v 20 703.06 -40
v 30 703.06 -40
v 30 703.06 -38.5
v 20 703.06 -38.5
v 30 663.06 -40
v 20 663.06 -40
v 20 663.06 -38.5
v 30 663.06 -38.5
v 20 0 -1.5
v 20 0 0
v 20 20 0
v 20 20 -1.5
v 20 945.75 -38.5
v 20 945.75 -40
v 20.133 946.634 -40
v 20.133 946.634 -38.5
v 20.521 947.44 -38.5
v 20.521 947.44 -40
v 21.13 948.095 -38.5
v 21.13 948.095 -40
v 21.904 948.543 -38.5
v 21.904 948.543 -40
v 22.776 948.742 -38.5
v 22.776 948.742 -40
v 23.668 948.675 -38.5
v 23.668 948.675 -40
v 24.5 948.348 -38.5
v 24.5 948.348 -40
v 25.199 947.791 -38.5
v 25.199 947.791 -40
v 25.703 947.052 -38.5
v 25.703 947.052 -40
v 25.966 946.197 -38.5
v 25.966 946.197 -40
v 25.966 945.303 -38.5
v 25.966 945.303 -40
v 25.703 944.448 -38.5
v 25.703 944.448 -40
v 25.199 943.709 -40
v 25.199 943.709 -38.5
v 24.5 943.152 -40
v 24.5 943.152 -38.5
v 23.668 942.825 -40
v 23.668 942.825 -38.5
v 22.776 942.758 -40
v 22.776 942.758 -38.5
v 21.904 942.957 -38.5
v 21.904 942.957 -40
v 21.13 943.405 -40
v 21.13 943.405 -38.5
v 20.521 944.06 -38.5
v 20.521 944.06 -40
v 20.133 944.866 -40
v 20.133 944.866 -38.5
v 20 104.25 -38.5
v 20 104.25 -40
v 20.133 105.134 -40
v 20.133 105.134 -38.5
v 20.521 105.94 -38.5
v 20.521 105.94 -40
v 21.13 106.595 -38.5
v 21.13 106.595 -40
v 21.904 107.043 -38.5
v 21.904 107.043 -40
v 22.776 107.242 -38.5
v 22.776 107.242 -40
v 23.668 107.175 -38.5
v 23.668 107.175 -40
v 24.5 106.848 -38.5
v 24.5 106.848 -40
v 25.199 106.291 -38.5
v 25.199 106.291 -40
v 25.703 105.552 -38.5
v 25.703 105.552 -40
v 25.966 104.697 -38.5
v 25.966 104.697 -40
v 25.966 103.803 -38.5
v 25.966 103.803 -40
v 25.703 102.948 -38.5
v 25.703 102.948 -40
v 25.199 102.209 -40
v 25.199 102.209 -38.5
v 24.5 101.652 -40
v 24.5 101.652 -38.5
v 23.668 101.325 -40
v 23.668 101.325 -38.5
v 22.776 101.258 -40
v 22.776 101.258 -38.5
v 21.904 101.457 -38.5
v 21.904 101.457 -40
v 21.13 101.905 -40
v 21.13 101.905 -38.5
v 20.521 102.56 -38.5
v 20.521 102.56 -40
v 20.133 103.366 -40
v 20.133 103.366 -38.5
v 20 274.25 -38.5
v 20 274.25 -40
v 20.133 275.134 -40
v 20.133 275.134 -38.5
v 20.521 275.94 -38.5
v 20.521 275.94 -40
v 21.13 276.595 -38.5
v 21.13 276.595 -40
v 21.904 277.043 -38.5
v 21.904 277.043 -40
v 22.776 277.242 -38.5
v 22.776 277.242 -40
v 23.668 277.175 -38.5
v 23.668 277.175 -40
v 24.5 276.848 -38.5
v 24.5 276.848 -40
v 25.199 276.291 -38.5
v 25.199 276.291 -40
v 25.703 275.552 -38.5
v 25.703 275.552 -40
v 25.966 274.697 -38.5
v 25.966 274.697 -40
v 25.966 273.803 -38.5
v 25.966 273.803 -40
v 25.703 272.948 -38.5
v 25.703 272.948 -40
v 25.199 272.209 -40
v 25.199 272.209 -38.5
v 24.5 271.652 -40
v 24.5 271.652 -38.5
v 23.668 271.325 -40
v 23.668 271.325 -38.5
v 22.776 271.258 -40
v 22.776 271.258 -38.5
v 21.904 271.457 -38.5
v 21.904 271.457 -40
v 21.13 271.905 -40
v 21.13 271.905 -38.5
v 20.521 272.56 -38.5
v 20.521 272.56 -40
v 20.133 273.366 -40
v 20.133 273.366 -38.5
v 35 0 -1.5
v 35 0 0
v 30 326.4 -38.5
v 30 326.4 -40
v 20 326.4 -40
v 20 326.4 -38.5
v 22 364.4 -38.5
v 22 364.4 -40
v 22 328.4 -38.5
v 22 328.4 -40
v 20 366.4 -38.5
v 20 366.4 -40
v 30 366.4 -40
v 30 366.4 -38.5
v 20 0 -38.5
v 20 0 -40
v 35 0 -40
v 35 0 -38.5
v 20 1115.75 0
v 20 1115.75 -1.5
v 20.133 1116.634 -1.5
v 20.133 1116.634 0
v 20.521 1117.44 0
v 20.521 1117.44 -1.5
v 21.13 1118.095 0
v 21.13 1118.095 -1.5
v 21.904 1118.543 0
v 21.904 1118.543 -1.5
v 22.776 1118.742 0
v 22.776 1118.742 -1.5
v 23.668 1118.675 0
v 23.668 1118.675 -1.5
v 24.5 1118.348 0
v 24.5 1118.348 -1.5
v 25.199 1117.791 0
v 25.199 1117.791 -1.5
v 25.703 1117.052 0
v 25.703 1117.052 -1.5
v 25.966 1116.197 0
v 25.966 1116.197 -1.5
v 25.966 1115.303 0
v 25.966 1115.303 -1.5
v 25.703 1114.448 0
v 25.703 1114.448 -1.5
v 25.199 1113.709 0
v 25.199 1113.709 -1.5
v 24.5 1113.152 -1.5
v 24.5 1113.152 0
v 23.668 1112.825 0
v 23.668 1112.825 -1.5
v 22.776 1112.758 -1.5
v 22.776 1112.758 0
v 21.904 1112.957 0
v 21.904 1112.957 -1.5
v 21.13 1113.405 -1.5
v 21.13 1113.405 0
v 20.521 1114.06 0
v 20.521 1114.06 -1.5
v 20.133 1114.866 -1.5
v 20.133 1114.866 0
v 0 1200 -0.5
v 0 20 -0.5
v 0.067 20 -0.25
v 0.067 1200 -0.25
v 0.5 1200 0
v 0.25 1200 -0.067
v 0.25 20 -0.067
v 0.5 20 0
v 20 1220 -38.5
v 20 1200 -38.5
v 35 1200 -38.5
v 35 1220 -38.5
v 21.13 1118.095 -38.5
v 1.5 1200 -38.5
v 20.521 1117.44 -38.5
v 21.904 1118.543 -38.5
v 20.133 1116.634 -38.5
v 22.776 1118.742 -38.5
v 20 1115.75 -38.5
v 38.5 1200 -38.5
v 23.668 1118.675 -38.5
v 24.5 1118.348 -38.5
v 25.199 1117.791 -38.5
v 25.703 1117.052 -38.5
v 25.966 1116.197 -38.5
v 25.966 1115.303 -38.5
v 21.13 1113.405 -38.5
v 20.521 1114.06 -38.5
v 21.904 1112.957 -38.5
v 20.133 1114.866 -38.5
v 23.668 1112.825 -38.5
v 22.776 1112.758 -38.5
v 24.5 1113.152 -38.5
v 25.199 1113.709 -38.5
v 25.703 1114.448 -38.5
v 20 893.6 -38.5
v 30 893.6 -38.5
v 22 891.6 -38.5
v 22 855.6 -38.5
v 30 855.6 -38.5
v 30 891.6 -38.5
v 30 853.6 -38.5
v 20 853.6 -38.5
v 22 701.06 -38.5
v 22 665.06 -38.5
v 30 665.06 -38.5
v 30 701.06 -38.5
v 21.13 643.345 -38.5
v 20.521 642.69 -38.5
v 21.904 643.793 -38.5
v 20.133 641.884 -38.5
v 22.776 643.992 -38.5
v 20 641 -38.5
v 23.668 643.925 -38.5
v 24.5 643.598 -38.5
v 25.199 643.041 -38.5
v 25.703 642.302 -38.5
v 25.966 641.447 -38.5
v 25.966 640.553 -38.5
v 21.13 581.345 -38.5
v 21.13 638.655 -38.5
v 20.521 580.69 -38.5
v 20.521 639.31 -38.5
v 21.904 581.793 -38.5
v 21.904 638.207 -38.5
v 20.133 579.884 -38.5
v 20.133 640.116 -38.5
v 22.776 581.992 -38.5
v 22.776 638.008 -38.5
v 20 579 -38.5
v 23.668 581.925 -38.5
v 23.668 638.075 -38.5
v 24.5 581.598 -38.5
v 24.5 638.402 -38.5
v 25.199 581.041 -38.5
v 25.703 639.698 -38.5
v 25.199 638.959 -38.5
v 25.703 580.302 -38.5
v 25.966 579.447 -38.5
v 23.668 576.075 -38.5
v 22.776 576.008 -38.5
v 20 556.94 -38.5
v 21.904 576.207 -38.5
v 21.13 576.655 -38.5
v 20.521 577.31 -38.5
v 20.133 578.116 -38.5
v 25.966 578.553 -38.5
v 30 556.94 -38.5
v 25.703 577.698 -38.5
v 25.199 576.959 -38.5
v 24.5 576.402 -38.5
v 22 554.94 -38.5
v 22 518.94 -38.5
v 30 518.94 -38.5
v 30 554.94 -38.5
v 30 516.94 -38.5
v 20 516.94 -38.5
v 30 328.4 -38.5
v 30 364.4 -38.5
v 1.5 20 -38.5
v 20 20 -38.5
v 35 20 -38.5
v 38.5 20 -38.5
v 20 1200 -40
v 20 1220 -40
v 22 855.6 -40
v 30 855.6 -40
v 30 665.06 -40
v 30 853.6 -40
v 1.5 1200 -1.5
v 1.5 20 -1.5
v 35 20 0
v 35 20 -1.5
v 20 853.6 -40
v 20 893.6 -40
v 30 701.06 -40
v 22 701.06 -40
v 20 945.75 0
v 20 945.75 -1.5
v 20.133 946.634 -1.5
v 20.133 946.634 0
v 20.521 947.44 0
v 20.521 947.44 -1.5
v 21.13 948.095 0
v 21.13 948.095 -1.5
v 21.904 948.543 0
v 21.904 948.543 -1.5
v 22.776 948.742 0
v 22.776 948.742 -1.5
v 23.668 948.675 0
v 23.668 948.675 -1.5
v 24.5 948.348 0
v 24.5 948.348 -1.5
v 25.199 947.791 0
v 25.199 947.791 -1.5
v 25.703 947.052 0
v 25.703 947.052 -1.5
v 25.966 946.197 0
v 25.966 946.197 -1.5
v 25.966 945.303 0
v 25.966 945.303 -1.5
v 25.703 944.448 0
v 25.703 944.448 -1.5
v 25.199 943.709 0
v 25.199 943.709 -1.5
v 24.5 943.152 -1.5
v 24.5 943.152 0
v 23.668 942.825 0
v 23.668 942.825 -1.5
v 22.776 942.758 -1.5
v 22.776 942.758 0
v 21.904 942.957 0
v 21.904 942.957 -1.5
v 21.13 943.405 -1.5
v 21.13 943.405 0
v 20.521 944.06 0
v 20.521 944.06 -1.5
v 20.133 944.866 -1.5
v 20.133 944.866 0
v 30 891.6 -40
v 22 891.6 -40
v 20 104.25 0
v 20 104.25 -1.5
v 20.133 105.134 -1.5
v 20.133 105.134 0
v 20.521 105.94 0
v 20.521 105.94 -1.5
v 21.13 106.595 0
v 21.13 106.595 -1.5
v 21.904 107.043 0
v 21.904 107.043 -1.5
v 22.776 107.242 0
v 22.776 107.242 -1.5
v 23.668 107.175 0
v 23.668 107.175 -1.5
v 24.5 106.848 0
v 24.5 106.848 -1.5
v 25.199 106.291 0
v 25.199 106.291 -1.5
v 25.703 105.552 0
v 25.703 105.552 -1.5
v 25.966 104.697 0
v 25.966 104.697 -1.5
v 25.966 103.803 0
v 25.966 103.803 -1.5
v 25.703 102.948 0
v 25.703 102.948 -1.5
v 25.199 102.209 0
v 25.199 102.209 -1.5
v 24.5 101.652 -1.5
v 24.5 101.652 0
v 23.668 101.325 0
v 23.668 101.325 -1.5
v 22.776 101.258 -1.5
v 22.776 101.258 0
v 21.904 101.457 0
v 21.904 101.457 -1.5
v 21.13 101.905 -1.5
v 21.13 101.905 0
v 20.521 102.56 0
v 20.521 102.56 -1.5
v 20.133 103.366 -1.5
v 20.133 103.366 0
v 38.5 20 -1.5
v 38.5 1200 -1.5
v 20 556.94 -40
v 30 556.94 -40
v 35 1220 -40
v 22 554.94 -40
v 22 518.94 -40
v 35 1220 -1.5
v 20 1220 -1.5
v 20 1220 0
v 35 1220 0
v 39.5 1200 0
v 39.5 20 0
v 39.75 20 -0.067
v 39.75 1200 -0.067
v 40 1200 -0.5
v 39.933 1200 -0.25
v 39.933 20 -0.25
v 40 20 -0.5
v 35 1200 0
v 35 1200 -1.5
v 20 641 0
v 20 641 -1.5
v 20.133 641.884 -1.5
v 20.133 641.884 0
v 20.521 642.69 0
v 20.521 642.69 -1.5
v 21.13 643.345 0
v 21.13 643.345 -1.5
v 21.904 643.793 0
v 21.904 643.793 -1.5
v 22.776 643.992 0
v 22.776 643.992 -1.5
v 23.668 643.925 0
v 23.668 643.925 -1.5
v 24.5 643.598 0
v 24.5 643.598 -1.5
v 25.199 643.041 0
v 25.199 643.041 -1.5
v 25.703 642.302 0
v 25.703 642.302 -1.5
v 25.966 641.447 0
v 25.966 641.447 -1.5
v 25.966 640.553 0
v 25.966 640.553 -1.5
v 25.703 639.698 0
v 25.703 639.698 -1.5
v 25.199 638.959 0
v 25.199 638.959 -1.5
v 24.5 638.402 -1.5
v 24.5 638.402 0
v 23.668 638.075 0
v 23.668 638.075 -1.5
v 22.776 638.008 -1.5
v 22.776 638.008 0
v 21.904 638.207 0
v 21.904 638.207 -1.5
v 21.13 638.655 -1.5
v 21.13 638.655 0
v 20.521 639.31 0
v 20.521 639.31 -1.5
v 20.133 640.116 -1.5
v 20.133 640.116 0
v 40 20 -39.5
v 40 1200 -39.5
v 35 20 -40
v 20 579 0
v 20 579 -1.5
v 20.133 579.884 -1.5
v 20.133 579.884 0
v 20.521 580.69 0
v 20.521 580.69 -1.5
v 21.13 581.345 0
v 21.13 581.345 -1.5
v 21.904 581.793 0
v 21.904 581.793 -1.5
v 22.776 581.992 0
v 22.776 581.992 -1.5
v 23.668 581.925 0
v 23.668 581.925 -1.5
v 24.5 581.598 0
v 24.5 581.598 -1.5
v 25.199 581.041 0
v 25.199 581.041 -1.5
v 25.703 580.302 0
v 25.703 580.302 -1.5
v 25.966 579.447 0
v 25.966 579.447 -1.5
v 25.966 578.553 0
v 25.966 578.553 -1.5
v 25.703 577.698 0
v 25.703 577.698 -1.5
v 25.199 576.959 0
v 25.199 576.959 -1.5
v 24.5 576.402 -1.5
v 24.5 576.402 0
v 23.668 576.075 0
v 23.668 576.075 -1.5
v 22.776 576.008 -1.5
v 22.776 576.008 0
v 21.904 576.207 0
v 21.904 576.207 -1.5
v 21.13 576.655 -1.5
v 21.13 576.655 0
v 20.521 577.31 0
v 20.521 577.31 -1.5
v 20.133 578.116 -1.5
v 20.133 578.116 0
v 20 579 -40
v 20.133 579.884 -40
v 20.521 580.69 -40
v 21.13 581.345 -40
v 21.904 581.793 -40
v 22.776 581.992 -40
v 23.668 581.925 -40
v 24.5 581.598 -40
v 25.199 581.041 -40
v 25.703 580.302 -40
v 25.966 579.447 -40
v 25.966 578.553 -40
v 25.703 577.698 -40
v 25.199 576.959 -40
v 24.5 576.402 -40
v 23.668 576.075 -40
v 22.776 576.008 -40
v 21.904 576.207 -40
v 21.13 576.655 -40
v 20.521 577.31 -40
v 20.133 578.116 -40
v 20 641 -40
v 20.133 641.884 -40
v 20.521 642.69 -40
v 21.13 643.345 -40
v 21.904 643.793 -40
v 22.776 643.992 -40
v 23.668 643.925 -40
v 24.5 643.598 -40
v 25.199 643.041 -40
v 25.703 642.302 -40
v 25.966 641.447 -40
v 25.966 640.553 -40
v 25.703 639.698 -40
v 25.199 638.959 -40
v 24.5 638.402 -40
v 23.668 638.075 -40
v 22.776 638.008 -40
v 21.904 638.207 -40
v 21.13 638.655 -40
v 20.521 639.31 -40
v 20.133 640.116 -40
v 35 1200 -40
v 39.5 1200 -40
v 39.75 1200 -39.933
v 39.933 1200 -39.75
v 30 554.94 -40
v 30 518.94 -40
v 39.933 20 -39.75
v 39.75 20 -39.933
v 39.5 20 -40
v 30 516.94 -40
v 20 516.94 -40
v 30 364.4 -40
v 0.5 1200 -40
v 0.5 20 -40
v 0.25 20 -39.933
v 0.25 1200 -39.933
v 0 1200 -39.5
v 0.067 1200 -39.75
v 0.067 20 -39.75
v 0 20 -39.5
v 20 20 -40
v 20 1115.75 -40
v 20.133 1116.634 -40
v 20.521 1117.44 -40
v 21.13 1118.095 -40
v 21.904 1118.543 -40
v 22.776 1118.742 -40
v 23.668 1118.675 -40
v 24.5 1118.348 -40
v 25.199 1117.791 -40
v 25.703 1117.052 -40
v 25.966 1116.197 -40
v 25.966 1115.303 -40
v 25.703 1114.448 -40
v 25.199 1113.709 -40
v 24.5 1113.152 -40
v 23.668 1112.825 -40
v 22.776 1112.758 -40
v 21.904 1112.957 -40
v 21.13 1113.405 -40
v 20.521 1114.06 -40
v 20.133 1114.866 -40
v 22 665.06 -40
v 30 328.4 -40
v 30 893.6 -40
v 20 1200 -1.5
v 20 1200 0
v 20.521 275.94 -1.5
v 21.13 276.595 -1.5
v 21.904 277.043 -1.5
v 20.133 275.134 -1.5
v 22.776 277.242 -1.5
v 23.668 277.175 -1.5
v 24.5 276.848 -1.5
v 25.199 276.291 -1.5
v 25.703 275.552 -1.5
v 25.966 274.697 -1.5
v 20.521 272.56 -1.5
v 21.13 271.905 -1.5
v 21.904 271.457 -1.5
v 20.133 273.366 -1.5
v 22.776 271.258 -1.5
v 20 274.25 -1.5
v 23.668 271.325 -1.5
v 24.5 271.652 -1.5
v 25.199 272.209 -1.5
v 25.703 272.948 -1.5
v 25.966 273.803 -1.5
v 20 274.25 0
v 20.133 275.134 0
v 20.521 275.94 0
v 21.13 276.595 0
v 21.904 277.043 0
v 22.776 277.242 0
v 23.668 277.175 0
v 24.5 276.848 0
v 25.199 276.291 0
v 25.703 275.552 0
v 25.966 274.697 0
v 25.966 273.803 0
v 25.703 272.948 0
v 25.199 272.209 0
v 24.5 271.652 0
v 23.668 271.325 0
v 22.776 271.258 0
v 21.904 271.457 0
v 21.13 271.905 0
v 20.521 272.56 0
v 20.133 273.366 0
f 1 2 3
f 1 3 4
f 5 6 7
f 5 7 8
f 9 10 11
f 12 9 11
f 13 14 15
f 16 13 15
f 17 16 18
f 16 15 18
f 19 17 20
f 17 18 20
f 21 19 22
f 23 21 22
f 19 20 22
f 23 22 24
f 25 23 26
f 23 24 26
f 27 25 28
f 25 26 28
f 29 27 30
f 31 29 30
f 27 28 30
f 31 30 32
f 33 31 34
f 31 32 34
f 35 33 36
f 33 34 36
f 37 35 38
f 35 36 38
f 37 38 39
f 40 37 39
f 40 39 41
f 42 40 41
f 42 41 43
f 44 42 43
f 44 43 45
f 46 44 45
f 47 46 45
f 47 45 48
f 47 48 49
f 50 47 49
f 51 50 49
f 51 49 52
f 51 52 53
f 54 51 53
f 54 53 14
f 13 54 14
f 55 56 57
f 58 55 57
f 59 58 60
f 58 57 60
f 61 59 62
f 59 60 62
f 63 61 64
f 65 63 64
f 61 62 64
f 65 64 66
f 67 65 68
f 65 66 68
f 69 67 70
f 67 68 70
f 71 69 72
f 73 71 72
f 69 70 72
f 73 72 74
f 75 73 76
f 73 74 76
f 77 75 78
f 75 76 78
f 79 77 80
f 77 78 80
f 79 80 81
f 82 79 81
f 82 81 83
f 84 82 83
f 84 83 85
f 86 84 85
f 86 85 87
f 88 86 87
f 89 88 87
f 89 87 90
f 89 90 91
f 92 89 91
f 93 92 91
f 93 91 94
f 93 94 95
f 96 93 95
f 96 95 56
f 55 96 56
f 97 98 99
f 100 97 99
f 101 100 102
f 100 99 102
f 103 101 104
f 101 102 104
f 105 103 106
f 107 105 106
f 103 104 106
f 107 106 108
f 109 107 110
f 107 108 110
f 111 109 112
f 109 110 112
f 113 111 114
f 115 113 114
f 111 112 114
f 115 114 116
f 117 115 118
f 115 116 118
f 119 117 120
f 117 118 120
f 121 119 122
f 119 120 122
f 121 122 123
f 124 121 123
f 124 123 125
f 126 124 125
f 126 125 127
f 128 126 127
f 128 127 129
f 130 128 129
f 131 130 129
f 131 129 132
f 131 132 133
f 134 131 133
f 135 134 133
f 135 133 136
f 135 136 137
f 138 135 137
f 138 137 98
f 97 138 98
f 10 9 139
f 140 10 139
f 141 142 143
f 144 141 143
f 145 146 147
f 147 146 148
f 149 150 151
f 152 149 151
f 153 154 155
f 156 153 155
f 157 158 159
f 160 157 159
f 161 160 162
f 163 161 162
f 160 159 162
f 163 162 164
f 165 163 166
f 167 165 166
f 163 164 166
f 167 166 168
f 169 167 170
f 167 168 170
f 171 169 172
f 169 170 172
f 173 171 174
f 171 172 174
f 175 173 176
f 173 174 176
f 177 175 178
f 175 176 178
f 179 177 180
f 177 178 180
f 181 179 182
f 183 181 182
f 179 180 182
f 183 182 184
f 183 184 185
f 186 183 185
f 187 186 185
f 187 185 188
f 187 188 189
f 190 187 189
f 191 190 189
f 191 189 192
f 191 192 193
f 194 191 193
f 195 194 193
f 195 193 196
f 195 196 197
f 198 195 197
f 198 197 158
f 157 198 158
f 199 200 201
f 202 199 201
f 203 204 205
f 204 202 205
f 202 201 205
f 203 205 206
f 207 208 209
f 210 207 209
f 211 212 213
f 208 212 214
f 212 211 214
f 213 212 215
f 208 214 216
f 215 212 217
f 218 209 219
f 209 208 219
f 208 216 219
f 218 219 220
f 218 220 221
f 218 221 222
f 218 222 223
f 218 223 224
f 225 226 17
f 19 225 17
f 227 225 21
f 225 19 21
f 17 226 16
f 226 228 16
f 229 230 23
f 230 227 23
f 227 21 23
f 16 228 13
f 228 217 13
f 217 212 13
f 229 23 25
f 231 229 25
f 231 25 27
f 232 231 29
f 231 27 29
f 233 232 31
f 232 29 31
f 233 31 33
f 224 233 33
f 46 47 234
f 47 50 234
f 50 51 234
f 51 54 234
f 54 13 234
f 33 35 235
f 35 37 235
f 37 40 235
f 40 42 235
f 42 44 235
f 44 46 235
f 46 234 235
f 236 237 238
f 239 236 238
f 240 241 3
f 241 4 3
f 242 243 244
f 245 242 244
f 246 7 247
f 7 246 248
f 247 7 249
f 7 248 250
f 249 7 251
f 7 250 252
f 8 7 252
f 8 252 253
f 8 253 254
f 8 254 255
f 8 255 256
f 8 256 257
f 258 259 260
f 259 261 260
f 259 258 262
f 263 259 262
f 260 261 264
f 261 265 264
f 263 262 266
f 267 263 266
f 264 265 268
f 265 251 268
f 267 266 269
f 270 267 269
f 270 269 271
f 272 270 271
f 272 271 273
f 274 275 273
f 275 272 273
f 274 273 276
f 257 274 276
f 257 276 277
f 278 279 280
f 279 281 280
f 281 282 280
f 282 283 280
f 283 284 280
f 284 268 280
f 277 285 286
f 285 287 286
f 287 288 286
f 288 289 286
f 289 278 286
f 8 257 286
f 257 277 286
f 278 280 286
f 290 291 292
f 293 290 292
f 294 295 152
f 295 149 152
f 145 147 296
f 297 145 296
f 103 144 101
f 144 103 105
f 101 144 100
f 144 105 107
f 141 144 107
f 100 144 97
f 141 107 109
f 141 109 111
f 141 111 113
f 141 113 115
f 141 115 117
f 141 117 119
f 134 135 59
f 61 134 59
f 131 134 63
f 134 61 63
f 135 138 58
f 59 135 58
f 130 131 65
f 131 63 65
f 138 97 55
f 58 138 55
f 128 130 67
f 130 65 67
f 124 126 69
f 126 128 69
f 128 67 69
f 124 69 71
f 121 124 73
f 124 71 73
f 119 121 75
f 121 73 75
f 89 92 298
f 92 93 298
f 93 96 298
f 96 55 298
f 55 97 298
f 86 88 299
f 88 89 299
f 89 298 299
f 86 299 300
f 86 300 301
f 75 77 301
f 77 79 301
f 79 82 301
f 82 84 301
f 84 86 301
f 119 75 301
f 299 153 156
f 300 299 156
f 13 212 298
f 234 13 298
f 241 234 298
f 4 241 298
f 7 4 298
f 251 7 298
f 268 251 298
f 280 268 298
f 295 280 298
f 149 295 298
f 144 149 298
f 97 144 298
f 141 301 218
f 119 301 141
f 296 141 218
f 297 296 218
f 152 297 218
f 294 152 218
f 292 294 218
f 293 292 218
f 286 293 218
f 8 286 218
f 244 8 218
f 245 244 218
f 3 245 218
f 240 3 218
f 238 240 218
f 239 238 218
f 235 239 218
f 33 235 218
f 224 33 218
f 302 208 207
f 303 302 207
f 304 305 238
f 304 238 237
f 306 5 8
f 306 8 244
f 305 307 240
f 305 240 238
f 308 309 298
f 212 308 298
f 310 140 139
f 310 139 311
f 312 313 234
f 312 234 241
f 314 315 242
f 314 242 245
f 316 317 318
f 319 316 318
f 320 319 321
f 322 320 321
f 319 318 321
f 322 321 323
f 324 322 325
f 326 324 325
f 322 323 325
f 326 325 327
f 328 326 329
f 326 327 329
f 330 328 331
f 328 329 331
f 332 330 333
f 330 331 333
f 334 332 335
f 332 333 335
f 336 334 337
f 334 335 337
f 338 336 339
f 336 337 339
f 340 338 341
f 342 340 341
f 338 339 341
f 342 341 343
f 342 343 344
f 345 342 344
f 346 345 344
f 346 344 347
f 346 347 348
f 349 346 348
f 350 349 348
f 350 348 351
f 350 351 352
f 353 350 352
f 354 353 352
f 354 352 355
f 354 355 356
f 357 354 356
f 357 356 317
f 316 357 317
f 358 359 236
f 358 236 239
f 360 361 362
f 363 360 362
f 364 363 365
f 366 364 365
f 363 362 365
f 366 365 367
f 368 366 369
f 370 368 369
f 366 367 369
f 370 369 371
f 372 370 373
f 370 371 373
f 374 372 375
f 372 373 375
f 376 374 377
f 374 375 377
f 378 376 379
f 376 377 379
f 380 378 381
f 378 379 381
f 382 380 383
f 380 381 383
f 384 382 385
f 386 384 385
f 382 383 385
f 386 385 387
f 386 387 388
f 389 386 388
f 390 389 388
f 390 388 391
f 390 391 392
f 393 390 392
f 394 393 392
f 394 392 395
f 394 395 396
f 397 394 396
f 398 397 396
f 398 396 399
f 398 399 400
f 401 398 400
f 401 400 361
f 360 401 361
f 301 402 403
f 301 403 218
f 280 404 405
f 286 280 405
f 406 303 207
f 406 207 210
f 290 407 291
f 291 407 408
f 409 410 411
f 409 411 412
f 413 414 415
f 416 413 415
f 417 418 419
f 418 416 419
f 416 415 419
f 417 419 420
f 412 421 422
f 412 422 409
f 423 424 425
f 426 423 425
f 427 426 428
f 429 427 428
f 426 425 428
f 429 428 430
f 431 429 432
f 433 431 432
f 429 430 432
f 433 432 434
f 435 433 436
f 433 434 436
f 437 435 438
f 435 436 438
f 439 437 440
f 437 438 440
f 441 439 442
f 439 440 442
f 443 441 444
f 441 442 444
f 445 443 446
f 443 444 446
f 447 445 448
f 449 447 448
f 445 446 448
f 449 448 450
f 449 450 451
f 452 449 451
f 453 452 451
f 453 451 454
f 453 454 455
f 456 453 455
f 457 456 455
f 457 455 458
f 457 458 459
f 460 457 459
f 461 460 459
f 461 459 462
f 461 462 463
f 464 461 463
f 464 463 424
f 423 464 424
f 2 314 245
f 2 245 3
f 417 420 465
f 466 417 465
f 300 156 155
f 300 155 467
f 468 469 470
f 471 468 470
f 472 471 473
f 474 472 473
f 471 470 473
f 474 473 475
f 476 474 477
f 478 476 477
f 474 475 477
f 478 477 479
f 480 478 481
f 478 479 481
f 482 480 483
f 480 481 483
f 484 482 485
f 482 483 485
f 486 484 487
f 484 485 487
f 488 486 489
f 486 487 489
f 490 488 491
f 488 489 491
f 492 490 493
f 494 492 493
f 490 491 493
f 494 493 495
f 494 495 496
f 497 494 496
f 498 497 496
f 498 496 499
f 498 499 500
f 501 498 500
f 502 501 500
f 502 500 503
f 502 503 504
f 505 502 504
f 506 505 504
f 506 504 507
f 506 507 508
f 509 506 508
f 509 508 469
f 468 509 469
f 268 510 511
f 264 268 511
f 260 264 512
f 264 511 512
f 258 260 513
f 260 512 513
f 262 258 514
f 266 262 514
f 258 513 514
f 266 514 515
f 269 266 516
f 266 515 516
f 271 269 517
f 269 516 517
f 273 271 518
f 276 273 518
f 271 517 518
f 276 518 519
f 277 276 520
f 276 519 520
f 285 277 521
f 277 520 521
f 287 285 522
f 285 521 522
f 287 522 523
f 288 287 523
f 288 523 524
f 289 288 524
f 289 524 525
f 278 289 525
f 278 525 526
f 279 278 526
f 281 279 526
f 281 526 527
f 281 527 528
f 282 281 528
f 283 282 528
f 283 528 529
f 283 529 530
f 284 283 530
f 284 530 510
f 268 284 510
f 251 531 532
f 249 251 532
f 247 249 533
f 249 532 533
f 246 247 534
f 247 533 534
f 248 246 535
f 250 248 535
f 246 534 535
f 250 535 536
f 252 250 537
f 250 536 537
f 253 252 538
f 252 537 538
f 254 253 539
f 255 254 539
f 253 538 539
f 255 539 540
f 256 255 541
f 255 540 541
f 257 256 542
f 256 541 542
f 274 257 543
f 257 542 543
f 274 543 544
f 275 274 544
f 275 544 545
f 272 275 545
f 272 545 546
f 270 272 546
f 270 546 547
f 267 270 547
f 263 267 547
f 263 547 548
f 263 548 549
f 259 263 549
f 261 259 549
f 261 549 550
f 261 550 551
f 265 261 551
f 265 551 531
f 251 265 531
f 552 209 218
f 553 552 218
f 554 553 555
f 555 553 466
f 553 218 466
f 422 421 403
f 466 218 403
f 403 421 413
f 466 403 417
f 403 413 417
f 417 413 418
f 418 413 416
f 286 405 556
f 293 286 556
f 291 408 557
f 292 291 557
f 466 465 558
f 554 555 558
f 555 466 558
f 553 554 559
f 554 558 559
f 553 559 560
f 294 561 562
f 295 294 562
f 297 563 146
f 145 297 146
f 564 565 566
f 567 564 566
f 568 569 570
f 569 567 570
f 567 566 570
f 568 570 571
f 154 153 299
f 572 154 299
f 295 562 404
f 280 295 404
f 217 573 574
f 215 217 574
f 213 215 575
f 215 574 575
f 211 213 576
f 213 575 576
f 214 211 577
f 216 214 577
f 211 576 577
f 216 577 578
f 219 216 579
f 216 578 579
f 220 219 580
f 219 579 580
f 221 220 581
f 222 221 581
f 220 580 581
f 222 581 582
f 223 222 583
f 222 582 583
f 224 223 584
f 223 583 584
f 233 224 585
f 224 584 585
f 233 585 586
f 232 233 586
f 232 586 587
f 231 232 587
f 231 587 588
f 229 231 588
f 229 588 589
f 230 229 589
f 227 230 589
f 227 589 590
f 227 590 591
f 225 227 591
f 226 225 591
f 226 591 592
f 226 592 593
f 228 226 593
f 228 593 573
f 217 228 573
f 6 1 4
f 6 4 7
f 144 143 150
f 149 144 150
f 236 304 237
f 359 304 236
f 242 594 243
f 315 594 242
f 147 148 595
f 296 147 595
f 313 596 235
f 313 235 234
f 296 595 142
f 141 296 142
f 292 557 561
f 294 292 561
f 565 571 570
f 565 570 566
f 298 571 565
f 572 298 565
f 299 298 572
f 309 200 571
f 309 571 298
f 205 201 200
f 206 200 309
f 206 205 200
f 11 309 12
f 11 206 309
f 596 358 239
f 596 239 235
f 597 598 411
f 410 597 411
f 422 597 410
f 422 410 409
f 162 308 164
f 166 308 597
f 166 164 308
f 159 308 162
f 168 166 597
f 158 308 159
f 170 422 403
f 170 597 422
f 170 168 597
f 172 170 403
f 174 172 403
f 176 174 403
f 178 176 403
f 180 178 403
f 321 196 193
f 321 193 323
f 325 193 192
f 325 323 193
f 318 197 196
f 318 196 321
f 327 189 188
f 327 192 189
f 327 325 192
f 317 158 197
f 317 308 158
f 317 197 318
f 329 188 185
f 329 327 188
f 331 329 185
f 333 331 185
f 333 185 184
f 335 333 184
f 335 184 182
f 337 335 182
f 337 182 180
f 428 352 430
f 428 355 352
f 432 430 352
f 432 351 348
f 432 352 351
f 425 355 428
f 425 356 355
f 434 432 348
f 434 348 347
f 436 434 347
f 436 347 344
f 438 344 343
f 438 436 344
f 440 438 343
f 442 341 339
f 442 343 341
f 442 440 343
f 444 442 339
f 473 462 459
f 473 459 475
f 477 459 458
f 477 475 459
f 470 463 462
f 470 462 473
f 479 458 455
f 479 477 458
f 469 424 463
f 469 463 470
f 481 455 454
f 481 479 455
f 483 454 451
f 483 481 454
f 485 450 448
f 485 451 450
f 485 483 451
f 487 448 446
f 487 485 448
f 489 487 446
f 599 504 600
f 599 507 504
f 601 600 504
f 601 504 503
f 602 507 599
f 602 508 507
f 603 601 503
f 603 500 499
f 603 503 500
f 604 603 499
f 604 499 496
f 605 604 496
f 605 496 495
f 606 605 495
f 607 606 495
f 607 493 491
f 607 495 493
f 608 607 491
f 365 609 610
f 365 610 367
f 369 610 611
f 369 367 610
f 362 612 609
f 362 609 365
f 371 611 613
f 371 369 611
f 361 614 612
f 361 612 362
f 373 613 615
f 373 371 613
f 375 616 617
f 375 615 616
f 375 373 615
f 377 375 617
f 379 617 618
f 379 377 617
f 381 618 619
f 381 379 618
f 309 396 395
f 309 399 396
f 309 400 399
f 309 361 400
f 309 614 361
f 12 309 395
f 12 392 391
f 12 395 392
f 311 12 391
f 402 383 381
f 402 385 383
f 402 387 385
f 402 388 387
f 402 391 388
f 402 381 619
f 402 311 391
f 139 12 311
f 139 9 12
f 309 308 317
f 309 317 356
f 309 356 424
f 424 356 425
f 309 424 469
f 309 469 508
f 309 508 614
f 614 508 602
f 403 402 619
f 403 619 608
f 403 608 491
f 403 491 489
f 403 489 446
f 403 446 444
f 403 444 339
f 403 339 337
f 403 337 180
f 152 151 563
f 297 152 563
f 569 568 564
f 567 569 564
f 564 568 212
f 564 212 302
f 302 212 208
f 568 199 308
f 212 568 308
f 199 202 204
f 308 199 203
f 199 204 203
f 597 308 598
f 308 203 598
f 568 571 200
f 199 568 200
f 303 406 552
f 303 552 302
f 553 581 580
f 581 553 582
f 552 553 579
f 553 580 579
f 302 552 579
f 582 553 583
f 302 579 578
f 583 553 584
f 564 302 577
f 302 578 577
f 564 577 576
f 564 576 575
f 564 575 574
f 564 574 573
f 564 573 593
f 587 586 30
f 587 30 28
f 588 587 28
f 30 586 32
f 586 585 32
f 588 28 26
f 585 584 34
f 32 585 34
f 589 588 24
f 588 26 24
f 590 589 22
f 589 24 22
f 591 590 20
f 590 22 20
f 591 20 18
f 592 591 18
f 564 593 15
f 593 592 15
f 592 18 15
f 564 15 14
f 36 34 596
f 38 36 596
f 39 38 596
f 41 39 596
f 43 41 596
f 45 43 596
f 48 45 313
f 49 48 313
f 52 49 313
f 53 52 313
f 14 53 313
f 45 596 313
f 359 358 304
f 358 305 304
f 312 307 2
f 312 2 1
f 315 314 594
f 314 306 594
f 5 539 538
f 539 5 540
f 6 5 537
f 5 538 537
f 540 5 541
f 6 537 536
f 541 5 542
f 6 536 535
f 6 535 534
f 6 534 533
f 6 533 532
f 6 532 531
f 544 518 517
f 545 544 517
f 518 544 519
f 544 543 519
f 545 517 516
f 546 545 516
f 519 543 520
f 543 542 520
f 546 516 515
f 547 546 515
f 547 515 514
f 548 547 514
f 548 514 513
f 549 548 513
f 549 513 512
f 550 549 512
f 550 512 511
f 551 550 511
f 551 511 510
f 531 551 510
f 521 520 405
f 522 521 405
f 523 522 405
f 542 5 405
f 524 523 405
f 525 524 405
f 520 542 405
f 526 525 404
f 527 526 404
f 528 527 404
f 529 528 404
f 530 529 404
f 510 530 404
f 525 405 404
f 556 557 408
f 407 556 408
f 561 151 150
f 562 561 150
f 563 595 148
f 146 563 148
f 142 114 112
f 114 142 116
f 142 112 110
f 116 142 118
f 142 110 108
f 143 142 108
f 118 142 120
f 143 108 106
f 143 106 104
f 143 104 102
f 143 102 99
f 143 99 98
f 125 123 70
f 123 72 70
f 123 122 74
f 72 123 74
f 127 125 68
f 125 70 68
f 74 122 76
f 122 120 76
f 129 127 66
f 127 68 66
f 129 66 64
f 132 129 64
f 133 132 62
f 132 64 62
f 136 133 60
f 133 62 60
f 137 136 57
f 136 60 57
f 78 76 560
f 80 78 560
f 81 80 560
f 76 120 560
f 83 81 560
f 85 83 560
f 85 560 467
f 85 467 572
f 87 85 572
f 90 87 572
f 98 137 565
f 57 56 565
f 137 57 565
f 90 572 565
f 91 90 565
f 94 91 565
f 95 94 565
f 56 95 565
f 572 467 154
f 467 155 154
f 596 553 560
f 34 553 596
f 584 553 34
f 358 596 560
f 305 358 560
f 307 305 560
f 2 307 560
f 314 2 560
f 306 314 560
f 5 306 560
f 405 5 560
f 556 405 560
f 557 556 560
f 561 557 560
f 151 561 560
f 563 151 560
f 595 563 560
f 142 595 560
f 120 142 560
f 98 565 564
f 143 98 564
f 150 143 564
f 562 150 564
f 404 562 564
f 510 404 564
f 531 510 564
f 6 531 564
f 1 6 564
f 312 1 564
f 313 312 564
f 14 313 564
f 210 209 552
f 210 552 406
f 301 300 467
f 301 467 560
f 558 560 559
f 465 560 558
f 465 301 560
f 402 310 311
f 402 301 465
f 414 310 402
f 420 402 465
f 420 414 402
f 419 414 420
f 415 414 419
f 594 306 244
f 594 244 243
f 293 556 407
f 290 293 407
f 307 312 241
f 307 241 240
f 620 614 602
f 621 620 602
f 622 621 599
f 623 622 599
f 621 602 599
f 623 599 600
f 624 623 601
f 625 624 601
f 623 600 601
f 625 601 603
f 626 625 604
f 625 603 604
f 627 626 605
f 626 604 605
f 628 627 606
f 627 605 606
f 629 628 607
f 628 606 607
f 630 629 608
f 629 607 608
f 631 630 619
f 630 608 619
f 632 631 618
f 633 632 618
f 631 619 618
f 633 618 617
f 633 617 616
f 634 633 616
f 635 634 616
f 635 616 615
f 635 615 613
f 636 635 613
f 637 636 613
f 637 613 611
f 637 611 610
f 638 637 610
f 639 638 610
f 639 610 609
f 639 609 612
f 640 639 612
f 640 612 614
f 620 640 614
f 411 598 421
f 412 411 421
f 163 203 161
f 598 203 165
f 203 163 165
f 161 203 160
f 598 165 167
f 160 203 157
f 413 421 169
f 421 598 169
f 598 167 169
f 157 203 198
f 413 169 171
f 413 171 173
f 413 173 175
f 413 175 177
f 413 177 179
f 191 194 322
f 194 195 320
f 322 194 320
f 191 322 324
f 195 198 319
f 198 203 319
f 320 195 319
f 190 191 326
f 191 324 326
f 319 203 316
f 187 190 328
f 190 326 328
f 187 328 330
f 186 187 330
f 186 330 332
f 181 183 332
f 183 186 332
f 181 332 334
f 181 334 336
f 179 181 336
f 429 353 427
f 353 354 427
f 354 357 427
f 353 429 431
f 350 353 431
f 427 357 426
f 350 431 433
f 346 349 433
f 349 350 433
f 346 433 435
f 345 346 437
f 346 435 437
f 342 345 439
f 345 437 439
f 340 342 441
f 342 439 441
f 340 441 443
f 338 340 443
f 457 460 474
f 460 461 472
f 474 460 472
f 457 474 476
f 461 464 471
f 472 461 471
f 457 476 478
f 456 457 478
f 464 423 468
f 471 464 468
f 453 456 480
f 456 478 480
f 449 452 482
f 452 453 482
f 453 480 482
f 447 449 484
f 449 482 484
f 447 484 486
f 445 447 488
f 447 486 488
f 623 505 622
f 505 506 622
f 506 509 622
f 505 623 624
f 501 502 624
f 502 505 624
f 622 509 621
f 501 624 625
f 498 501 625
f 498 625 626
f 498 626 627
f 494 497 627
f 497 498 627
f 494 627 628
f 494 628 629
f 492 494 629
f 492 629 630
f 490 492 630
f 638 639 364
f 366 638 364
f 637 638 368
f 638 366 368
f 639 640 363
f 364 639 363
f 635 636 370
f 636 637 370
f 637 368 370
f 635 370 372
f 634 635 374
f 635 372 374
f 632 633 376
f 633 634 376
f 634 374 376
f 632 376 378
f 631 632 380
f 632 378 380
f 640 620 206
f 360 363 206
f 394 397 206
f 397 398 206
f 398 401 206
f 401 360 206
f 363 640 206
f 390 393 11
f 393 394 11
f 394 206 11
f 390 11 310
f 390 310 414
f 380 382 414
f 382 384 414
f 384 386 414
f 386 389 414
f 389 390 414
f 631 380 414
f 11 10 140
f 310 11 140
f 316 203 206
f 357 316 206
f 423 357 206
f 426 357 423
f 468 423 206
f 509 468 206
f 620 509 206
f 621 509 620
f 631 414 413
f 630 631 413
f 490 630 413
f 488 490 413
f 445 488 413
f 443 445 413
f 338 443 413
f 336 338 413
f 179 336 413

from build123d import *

# Parameters (mm, degrees)
SKETCH1_W           = 37
SKETCH1_H           = 37
BOSS_EXTRUDE1_DEPTH = 1220
SKETCH2_W           = 20
SKETCH2_H           = 20
SKETCH2_W_2         = 5
CUT_EXTRUDE1_DEPTH  = 50
CUT_EXTRUDE2_DEPTH  = 10
CUT_EXTRUDE3_DEPTH  = 10
SKETCH5_R           = 3
CUT_EXTRUDE4_DEPTH  = 1222.310771262


with BuildPart() as part:
    # Sketch1 → Boss-Extrude1 (new body)
    with BuildSketch(Plane(origin=(0, 0, 0), x_dir=(1, 0, 0), z_dir=(0, 1, 0))):
        with BuildLine():
            Line((0.5, 0), (39.5, 0))
            ThreePointArc((39.5, 0), (39.853553391, 0.146446609), (40, 0.5))
            Line((40, 0.5), (40, 39.5))
            ThreePointArc((40, 39.5), (39.853553391, 39.853553391), (39.5, 40))
            Line((39.5, 40), (0.5, 40))
            ThreePointArc((0.5, 40), (0.146446609, 39.853553391), (0, 39.5))
            Line((0, 39.5), (0, 0.5))
            ThreePointArc((0, 0.5), (0.146446609, 0.146446609), (0.5, 0))
        make_face()
        with Locations((20, 20)):
            Rectangle(SKETCH1_W, SKETCH1_H, mode=Mode.SUBTRACT)
    extrude(amount=BOSS_EXTRUDE1_DEPTH)

    # Sketch2 → Cut-Extrude1 (cut)
    with BuildSketch(Plane.XY):
        with Locations((10, 1210)):
            Rectangle(SKETCH2_W, SKETCH2_H)
        with Locations((37.5, 1210)):
            Rectangle(SKETCH2_W_2, SKETCH2_H)
        with Locations((10, 10)):
            Rectangle(SKETCH2_W, SKETCH2_H)
        with Locations((37.5, 10)):
            Rectangle(SKETCH2_W_2, SKETCH2_H)
    extrude(amount=-CUT_EXTRUDE1_DEPTH, mode=Mode.SUBTRACT)

    # Sketch3 → Cut-Extrude2 (cut)
    with BuildSketch(Plane.XY.offset(-40)):
        Polygon((30, 893.6), (20, 893.6), (20, 853.6), (30, 853.6), (30, 855.6), (22, 855.6), (22, 891.6), (30, 891.6), align=None)
        Polygon((20, 326.4), (20, 366.4), (30, 366.4), (30, 364.4), (22, 364.4), (22, 328.4), (30, 328.4), (30, 326.4), align=None)
    extrude(amount=CUT_EXTRUDE2_DEPTH, mode=Mode.SUBTRACT)

    # Sketch4 → Cut-Extrude3 (cut)
    with BuildSketch(Plane(origin=(0, 0, -40), x_dir=(-1, 0, 0), z_dir=(0, 0, -1))):
        Polygon((-30, 703.06), (-20, 703.06), (-20, 663.06), (-30, 663.06), (-30, 665.06), (-22, 665.06), (-22, 701.06), (-30, 701.06), align=None)
        Polygon((-30, 518.94), (-30, 516.94), (-20, 516.94), (-20, 556.94), (-30, 556.94), (-30, 554.94), (-22, 554.94), (-22, 518.94), align=None)
    extrude(amount=-CUT_EXTRUDE3_DEPTH, mode=Mode.SUBTRACT)

    # Sketch5 → Cut-Extrude4 (cut, through all)
    with BuildSketch(Plane(origin=(0, 0, -40), x_dir=(-1, 0, 0), z_dir=(0, 0, -1))):
        with Locations((-23, 1115.75)):
            Circle(SKETCH5_R)
        with Locations((-23, 945.75)):
            Circle(SKETCH5_R)
        with Locations((-23, 641)):
            Circle(SKETCH5_R)
        with Locations((-23, 579)):
            Circle(SKETCH5_R)
        with Locations((-23, 274.25)):
            Circle(SKETCH5_R)
        with Locations((-23, 104.25)):
            Circle(SKETCH5_R)
    extrude(amount=-CUT_EXTRUDE4_DEPTH, mode=Mode.SUBTRACT)


solid = part.part
